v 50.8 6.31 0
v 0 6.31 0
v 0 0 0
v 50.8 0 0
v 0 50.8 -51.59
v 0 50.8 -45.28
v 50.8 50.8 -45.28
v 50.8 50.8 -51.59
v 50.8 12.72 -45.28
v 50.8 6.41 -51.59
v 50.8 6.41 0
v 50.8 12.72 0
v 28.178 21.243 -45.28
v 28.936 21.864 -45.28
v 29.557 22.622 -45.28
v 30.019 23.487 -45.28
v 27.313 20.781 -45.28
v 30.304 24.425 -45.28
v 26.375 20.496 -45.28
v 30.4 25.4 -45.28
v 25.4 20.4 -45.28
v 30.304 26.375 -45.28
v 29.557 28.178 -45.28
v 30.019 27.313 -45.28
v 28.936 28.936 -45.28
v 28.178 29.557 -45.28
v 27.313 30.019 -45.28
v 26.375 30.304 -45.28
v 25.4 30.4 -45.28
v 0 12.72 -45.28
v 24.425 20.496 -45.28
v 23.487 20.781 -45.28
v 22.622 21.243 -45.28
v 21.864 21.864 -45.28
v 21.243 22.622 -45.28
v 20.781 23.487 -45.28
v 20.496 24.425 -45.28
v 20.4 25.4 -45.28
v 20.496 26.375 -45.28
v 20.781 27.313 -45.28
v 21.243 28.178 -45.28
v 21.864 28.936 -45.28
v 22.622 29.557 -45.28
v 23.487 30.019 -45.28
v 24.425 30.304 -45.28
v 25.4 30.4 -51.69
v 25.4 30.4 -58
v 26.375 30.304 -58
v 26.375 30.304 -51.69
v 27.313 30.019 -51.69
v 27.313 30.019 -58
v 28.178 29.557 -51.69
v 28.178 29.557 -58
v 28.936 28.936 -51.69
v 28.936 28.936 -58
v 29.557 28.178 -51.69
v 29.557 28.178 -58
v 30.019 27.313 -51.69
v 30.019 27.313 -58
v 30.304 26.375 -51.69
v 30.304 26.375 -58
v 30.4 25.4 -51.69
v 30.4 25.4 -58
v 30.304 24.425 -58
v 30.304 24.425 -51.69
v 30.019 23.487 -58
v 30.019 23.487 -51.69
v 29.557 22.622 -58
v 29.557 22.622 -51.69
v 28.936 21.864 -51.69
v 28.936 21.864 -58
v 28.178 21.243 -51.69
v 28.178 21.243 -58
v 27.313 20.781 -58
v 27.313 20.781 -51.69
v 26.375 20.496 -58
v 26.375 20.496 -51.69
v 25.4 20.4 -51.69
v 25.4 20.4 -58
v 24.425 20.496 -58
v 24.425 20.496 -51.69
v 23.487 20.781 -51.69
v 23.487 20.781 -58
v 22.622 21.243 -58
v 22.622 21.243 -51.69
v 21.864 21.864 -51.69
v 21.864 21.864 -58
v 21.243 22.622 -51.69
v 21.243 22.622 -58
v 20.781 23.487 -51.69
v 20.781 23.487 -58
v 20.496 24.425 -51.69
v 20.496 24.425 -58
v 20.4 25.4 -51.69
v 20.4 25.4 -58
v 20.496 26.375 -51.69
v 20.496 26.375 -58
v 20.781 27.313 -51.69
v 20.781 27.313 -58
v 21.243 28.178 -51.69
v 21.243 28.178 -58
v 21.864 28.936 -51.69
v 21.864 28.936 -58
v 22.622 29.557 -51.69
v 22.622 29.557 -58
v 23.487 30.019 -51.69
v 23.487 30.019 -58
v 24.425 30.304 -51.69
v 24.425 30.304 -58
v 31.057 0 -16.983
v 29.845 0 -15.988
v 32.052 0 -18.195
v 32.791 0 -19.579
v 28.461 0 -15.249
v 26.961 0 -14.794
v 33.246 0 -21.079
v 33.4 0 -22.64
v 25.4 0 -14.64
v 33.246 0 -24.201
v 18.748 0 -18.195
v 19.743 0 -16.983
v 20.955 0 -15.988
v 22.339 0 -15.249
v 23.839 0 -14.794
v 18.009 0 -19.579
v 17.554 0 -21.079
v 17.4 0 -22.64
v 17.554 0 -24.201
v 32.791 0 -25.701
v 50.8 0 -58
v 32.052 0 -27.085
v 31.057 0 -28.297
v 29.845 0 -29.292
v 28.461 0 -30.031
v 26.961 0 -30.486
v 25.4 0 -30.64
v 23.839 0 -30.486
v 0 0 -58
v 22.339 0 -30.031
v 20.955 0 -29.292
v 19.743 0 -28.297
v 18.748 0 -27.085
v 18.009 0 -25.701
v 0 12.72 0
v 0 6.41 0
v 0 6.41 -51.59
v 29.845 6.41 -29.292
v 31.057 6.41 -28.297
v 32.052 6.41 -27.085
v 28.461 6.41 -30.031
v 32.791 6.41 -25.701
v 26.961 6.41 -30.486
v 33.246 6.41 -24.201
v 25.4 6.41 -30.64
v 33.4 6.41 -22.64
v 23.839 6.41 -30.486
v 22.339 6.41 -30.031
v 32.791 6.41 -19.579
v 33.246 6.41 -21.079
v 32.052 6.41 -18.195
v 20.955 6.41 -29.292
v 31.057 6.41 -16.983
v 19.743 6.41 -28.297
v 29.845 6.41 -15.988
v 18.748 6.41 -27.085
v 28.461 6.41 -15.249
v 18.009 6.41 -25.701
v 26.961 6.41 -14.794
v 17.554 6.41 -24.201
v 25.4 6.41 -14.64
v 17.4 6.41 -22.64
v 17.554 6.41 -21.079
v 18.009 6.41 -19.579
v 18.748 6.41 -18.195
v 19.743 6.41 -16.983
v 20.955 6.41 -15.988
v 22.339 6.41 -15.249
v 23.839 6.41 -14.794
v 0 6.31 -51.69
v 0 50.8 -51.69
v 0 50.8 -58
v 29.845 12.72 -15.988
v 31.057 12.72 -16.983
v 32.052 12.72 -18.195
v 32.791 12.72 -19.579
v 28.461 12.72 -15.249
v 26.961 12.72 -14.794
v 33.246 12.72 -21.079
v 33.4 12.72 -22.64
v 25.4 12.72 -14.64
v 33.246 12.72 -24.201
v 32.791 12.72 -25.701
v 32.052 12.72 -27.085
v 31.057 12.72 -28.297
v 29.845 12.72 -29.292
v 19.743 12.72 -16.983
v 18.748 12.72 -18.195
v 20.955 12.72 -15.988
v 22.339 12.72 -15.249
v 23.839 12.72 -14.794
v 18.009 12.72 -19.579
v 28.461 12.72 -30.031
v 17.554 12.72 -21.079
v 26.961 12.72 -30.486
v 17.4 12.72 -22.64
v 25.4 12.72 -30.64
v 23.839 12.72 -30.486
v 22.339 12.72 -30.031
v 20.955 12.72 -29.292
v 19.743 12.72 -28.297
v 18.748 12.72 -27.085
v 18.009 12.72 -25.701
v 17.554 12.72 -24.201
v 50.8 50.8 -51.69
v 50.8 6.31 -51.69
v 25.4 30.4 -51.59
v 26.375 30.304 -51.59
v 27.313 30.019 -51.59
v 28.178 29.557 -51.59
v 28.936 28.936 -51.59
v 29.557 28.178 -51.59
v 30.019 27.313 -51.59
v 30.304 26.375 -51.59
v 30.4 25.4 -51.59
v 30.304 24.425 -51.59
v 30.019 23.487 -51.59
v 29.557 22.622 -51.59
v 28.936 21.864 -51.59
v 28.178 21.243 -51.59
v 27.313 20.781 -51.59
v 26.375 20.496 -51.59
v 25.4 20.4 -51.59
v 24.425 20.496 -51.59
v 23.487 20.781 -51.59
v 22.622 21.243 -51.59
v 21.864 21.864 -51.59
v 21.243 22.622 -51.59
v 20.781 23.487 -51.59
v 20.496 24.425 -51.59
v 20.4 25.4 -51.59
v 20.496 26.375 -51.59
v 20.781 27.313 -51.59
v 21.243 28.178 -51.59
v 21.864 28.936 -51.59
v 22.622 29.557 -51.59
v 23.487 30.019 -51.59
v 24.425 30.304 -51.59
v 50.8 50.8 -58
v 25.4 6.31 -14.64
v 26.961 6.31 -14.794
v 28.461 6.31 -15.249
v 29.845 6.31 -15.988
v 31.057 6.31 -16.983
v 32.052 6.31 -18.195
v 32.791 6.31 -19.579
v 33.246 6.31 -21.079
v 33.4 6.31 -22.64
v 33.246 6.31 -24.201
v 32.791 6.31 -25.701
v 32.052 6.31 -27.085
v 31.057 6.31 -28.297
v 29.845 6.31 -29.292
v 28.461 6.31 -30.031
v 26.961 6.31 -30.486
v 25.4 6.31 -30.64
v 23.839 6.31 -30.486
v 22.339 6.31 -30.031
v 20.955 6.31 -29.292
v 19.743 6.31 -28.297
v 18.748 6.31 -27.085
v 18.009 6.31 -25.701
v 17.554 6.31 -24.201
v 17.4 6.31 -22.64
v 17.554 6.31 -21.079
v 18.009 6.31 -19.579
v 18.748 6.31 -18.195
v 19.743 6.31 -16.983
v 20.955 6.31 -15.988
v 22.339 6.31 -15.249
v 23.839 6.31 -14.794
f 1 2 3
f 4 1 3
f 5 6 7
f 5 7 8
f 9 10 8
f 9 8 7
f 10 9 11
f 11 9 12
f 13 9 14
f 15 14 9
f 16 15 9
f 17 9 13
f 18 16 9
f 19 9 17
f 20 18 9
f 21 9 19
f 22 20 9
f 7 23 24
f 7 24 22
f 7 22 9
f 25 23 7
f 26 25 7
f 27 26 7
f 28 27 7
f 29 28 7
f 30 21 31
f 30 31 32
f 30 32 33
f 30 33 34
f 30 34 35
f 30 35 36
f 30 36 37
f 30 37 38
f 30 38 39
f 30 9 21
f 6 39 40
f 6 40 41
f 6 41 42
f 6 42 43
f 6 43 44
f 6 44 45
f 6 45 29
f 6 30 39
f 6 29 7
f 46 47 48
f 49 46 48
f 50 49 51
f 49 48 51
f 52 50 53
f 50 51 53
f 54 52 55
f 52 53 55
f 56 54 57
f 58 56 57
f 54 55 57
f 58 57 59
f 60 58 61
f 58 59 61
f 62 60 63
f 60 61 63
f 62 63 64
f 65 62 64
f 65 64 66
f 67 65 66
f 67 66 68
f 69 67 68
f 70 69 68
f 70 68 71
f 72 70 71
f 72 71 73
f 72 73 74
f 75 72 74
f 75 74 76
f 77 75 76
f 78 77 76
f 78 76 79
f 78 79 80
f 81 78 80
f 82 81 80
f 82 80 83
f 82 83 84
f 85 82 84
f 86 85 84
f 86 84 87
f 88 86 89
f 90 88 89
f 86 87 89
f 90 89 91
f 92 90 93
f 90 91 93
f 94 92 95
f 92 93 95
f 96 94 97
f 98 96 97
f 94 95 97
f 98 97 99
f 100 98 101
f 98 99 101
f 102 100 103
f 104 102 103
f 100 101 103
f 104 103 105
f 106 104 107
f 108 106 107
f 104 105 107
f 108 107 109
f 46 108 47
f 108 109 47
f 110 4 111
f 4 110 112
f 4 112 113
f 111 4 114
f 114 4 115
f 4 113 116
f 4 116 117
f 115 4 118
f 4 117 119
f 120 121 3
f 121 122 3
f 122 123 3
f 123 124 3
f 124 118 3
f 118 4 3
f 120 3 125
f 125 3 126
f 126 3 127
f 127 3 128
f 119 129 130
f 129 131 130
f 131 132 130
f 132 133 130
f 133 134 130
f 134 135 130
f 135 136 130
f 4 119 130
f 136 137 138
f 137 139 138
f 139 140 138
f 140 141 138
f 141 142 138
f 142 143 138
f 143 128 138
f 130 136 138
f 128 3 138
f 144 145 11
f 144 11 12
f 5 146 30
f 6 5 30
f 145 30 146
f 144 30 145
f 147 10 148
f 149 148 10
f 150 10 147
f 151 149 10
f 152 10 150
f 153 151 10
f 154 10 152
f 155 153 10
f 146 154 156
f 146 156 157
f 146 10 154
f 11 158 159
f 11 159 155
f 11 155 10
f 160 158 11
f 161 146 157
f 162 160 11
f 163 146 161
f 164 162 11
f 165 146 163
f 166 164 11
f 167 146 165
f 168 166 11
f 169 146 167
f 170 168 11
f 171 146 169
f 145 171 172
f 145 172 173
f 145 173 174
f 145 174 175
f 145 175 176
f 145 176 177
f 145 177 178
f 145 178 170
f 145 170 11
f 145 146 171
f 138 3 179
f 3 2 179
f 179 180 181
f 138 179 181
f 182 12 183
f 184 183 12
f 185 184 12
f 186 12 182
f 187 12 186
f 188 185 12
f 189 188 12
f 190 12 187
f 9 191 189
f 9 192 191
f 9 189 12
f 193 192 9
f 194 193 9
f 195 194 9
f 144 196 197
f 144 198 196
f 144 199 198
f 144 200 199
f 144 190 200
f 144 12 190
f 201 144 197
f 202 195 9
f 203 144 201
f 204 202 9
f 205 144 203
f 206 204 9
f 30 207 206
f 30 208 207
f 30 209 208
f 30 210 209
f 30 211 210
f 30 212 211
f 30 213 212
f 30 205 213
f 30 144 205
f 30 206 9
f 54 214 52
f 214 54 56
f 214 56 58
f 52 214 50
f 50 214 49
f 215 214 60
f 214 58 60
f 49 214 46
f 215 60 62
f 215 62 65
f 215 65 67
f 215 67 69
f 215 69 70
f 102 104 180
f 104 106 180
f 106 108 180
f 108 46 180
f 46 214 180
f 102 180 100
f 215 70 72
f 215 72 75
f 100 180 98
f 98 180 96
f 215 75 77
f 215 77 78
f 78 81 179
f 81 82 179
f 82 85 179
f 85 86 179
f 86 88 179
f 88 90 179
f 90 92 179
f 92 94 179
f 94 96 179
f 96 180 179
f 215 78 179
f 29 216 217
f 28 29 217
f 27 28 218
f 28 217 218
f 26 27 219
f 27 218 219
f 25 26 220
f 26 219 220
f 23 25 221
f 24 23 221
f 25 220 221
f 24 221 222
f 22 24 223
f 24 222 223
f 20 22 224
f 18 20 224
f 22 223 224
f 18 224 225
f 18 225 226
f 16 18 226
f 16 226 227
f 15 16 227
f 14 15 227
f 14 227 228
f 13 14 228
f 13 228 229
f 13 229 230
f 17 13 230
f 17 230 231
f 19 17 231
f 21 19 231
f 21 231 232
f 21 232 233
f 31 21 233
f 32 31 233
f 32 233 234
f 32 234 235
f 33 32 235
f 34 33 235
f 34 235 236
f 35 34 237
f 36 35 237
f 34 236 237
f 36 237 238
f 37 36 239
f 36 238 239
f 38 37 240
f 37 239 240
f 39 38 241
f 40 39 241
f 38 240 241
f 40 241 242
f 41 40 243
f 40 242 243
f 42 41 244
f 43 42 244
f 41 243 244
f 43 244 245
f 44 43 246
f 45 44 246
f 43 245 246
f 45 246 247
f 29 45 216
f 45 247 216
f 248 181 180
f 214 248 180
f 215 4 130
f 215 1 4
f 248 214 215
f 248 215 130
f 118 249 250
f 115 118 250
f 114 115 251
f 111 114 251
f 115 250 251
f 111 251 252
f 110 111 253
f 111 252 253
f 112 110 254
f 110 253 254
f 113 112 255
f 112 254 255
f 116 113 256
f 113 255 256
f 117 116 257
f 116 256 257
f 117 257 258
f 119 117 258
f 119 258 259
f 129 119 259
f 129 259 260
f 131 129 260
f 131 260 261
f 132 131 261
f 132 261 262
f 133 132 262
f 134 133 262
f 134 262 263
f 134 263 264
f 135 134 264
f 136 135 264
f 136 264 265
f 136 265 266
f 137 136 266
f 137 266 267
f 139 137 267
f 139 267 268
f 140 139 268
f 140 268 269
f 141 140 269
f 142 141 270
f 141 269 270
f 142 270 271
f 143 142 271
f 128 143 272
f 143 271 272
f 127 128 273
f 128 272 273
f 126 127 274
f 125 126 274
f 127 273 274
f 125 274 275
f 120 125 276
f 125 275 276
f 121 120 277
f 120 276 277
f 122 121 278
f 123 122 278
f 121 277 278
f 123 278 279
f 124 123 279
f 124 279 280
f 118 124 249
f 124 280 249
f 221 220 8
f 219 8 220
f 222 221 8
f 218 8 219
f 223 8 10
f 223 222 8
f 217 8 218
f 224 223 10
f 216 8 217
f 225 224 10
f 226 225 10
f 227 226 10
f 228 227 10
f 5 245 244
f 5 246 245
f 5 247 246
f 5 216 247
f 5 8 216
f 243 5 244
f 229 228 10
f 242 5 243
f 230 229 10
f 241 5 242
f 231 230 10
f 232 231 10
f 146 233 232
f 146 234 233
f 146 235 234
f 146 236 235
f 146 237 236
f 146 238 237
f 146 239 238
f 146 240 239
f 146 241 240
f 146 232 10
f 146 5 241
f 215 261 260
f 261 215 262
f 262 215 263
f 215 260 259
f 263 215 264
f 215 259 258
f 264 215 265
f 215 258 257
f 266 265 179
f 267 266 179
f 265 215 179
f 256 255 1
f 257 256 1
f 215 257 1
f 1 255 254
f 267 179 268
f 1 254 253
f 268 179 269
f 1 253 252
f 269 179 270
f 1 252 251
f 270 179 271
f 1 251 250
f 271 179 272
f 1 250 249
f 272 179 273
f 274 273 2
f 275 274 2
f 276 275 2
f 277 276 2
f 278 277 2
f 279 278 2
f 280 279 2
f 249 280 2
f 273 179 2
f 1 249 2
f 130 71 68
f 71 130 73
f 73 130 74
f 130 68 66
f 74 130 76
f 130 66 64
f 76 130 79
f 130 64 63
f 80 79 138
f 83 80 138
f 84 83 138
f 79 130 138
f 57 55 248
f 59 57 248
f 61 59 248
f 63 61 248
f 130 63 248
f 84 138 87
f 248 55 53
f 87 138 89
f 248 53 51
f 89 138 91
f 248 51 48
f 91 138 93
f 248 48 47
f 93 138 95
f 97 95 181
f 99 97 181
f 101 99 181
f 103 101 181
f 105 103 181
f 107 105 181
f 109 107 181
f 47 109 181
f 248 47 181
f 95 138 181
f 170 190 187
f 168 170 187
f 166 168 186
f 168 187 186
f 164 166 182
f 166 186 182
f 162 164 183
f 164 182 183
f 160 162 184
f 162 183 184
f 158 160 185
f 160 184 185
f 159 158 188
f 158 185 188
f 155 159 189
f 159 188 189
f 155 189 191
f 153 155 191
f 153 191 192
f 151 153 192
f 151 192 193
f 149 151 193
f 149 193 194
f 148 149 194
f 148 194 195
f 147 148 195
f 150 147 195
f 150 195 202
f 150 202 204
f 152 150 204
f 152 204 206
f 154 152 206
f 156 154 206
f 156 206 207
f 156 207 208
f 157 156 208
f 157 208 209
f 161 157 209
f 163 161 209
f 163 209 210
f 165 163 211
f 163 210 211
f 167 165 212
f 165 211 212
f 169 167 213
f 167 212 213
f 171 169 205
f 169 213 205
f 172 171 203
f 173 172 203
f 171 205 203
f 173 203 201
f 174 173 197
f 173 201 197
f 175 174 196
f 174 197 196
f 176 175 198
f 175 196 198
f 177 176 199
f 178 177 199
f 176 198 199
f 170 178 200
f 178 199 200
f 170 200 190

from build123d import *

# Parameters (mm, degrees)
SALIENTE_EXTRUIR1_DEPTH = 50.8
SALIENTE_EXTRUIR2_DEPTH = 50.8
CROQUIS3_R              = 8
CORTAR_EXTRUIR1_DEPTH   = 50.8
CROQUIS4_R              = 5
CORTAR_EXTRUIR2_DEPTH   = 24.525


with BuildPart() as part:
    # Croquis1 → Saliente-Extruir1 (new body)
    with BuildSketch(Plane(origin=(0, 0, 0), x_dir=(0, 0, -1), z_dir=(1, 0, 0))):
        Polygon((0, 0), (58, 0), (58, 50.8), (51.69, 50.8), (51.69, 6.31), (0, 6.31), align=None)
    extrude(amount=SALIENTE_EXTRUIR1_DEPTH)


with BuildPart() as body_2:
    # Croquis2 → Saliente-Extruir2 (new body)
    with BuildSketch(Plane.ZY):
        Polygon((-51.59, 50.8), (-51.59, 6.41), (0, 6.41), (0, 12.72), (-45.28, 12.72), (-45.28, 50.8), align=None)
    extrude(amount=-SALIENTE_EXTRUIR2_DEPTH)


with BuildPart() as cortar_extruir1_tool:
    # Croquis3 → Cortar-Extruir1 (new body)
    with BuildSketch(Plane(origin=(0, 12.72, 0), x_dir=(1, 0, 0), z_dir=(0, 1, 0))):
        with Locations(Location((25.4, 22.64, 0), (0, 0, 270))):
            Circle(CROQUIS3_R)
    extrude(amount=-CORTAR_EXTRUIR1_DEPTH)


with BuildPart() as part_1:
    add(part.part)

    # Cortar-Extruir1: cut by cortar_extruir1_tool
    add(cortar_extruir1_tool.part, mode=Mode.SUBTRACT)


with BuildPart() as body_2_1:
    add(body_2.part)

    # Cortar-Extruir1: cut by cortar_extruir1_tool
    add(cortar_extruir1_tool.part, mode=Mode.SUBTRACT)


with BuildPart() as cortar_extruir2_tool:
    # Croquis4 → Cortar-Extruir2 (new body)
    with BuildSketch(Plane(origin=(0, 0, -58), x_dir=(-1, 0, 0), z_dir=(0, 0, -1))):
        with Locations(Location((-25.4, 25.4, 0), (0, 0, 90))):
            Circle(CROQUIS4_R)
    extrude(amount=-CORTAR_EXTRUIR2_DEPTH)


with BuildPart() as part_2:
    add(part_1.part)

    # Cortar-Extruir2: cut by cortar_extruir2_tool
    add(cortar_extruir2_tool.part, mode=Mode.SUBTRACT)


with BuildPart() as body_2_2:
    add(body_2_1.part)

    # Cortar-Extruir2: cut by cortar_extruir2_tool
    add(cortar_extruir2_tool.part, mode=Mode.SUBTRACT)


solid = Compound([part_2.part, body_2_2.part])
